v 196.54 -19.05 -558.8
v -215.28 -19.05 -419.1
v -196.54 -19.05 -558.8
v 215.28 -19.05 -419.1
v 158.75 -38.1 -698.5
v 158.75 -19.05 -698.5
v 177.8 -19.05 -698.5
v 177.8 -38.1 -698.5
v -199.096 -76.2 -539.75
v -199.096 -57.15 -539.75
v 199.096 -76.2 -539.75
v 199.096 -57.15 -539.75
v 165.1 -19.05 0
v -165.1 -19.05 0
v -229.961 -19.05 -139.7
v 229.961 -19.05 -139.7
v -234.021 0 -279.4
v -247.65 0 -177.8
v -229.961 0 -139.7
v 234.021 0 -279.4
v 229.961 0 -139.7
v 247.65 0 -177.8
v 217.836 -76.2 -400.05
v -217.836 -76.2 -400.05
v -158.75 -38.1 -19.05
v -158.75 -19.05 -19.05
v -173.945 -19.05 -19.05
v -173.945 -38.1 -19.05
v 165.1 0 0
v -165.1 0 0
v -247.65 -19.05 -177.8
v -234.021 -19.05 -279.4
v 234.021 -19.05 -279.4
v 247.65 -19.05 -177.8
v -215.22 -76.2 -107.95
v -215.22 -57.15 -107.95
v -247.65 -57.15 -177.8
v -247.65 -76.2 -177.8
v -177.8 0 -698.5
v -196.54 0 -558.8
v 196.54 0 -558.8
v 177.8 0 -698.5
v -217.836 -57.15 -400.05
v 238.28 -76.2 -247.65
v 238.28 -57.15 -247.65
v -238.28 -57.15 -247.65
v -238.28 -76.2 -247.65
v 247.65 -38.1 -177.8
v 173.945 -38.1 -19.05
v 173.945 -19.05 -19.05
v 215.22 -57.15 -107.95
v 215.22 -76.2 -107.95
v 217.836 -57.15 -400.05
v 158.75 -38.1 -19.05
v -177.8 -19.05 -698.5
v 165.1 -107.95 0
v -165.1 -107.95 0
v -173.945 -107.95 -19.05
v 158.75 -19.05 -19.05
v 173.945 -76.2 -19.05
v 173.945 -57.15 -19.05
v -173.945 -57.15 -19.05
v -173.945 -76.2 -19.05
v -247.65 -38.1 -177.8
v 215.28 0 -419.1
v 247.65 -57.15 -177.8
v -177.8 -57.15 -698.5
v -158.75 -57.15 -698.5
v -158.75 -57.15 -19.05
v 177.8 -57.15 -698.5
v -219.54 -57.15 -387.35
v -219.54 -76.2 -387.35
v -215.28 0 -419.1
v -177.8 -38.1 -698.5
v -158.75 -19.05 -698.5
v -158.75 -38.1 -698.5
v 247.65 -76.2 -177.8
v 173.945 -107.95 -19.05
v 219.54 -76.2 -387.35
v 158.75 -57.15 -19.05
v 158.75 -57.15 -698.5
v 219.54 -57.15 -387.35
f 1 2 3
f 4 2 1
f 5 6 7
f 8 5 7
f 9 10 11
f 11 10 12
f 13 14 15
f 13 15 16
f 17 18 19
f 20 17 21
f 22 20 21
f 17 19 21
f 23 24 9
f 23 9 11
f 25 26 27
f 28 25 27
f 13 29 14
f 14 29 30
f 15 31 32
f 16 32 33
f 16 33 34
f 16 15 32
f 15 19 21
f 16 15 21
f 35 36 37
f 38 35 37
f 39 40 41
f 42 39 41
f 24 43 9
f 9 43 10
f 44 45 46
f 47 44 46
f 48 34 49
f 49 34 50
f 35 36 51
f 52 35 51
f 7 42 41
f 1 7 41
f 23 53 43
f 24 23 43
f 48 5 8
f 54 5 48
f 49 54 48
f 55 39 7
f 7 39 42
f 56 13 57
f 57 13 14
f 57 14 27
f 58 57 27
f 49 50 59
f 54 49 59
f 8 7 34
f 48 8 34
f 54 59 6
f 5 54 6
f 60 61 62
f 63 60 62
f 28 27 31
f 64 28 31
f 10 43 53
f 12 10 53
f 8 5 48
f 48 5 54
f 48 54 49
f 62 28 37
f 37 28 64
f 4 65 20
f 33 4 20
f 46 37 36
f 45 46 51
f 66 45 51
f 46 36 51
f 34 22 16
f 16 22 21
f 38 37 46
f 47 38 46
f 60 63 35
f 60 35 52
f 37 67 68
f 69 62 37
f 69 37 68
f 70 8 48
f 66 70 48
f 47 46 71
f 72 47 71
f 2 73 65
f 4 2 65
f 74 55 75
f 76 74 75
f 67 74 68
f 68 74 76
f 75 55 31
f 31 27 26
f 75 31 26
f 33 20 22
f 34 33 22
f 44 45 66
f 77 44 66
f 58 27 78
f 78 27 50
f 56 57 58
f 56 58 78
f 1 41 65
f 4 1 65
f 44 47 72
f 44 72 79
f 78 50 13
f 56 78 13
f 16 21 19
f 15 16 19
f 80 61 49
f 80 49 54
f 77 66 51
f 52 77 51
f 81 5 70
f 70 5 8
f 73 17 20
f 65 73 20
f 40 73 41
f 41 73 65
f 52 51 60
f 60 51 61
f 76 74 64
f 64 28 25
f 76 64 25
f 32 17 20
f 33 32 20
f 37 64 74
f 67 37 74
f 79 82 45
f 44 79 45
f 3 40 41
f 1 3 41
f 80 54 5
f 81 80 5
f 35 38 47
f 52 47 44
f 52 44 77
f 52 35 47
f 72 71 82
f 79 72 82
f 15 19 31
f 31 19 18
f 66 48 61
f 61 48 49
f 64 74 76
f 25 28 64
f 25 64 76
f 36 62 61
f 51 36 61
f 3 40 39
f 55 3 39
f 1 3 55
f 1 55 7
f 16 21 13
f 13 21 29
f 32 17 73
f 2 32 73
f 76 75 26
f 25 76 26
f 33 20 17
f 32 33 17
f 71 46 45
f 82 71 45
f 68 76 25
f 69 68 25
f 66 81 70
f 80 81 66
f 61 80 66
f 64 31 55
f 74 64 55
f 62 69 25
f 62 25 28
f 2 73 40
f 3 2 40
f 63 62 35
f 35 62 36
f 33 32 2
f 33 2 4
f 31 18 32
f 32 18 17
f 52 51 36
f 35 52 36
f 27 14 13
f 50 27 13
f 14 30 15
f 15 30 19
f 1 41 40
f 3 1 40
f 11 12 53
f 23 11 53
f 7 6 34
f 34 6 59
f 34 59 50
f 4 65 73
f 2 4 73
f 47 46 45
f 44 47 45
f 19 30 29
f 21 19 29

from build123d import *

# Parameters (mm, degrees)
F2_DEPTH  = 19.05
F3_DEPTH  = 19.05
F5_DEPTH  = 19.05
F7_DEPTH  = 19.05
F8_DEPTH  = 88.9
F10_DEPTH = 19.05
F11_DEPTH = 19.05


# Not quite as in the source:
# - a feature names something its author has since deleted; it is built from what else it names


with BuildPart() as f2:
    # F1 (on Front) → F2 (new body)
    with BuildSketch(Plane.XZ):
        Polygon((-215.2804878049, -419.1), (-196.5402439024, -558.8), (196.5402439024, -558.8), (215.2804878049, -419.1), align=None)
    extrude(amount=F2_DEPTH)


with BuildPart() as f2b:
    # F1 (on Front) → F2, piece 2 (new body)
    with BuildSketch(Plane.XZ):
        Polygon((-247.65, -177.8), (-234.0207317073, -279.4), (234.0207317073, -279.4), (247.65, -177.8), (229.9607142857, -139.7), (-229.9607142857, -139.7), align=None)
    extrude(amount=F2_DEPTH)


with BuildPart() as f3:
    # F1 (on Front) → F3 (new body)
    with BuildSketch(Plane.XZ):
        Polygon((-196.5402439024, -558.8), (-177.8, -698.5), (177.8, -698.5), (196.5402439024, -558.8), align=None)
    extrude(amount=F3_DEPTH)


with BuildPart() as f3b:
    # F1 (on Front) → F3, piece 2 (new body)
    with BuildSketch(Plane.XZ):
        Polygon((-234.0207317073, -279.4), (-215.2804878049, -419.1), (215.2804878049, -419.1), (234.0207317073, -279.4), align=None)
    extrude(amount=F3_DEPTH)


with BuildPart() as f3c:
    # F1 (on Front) → F3, piece 3 (new body)
    with BuildSketch(Plane.XZ):
        Polygon((-165.1, 0), (-229.9607142857, -139.7), (229.9607142857, -139.7), (165.1, 0), align=None)
    extrude(amount=F3_DEPTH)


with BuildPart() as f5:
    # F4 (on face) → F5 (new body)
    with BuildSketch(Plane.XZ.offset(19.05)):
        Polygon((-173.9446428571, -19.05), (-229.9607142857, -139.7), (-158.75, -139.7), (-158.75, -19.05), align=None)
        Polygon((-247.65, -177.8), (-177.8, -698.5), (-158.75, -698.5), (-158.75, -139.7), (-229.9607142857, -139.7), align=None)
    extrude(amount=F5_DEPTH)


with BuildPart() as f5b:
    # F4 (on face) → F5, piece 2 (new body)
    with BuildSketch(Plane.XZ.offset(19.05)):
        Polygon((158.75, -19.05), (158.75, -139.7), (229.9607142857, -139.7), (173.9446428571, -19.05), align=None)
        Polygon((229.9607142857, -139.7), (158.75, -139.7), (158.75, -698.5), (177.8, -698.5), (247.65, -177.8), align=None)
    extrude(amount=F5_DEPTH)


with BuildPart() as f7:
    # F6 (on face) → F7 (new body)
    with BuildSketch(Plane.XZ.offset(38.1)):
        Polygon((-247.65, -177.8), (-177.8, -698.5), (-158.75, -698.5), (-158.75, -19.05), (-173.9446428571, -19.05), align=None)
    extrude(amount=F7_DEPTH)


with BuildPart() as f7b:
    # F6 (on face) → F7, piece 2 (new body)
    with BuildSketch(Plane.XZ.offset(38.1)):
        Polygon((173.9446428571, -19.05), (158.75, -19.05), (158.75, -698.5), (177.8, -698.5), (247.65, -177.8), align=None)
    extrude(amount=F7_DEPTH)


with BuildPart() as f8:
    # F4 (on face) → F8 (new body)
    with BuildSketch(Plane.XZ.offset(19.05)):
        Polygon((-165.1, 0), (-173.9446428571, -19.05), (-158.75, -19.05), (158.75, -19.05), (173.9446428571, -19.05), (165.1, 0), align=None)
    extrude(amount=F8_DEPTH)


with BuildPart() as f10:
    # F9 (on face) → F10 (new body)
    with BuildSketch(Plane.XZ.offset(57.15)):
        Polygon((158.75, -107.95), (-215.2196428571, -107.95), (-247.65, -177.8), (-238.2798780488, -247.65), (158.75, -247.65), align=None)
        Polygon((215.2196428571, -107.95), (158.75, -107.95), (158.75, -247.65), (238.2798780488, -247.65), (247.65, -177.8), align=None)
    extrude(amount=F10_DEPTH)


with BuildPart() as f10b:
    # F9 (on face) → F10, piece 2 (new body)
    with BuildSketch(Plane.XZ.offset(57.15)):
        Polygon((158.75, -539.75), (158.75, -400.05), (-217.8359756098, -400.05), (-199.0957317073, -539.75), align=None)
        Polygon((217.8359756098, -400.05), (158.75, -400.05), (158.75, -539.75), (199.0957317073, -539.75), align=None)
    extrude(amount=F10_DEPTH)


with BuildPart() as f11:
    # F9 (on face) → F11 (new body)
    with BuildSketch(Plane.XZ.offset(57.15)):
        Polygon((158.75, -387.35), (158.75, -247.65), (-238.2798780488, -247.65), (-219.5396341463, -387.35), align=None)
        Polygon((238.2798780488, -247.65), (158.75, -247.65), (158.75, -387.35), (219.5396341463, -387.35), align=None)
    extrude(amount=F11_DEPTH)


with BuildPart() as f11b:
    # F9 (on face) → F11, piece 2 (new body)
    with BuildSketch(Plane.XZ.offset(57.15)):
        Polygon((158.75, -19.05), (-173.9446428571, -19.05), (-215.2196428571, -107.95), (158.75, -107.95), align=None)
        Polygon((173.9446428571, -19.05), (158.75, -19.05), (158.75, -107.95), (215.2196428571, -107.95), align=None)
    extrude(amount=F11_DEPTH)


solid = Compound([f2.part, f2b.part, f3.part, f3b.part, f3c.part, f5.part, f5b.part, f7.part, f7b.part, f8.part, f10.part, f10b.part, f11.part, f11b.part])
